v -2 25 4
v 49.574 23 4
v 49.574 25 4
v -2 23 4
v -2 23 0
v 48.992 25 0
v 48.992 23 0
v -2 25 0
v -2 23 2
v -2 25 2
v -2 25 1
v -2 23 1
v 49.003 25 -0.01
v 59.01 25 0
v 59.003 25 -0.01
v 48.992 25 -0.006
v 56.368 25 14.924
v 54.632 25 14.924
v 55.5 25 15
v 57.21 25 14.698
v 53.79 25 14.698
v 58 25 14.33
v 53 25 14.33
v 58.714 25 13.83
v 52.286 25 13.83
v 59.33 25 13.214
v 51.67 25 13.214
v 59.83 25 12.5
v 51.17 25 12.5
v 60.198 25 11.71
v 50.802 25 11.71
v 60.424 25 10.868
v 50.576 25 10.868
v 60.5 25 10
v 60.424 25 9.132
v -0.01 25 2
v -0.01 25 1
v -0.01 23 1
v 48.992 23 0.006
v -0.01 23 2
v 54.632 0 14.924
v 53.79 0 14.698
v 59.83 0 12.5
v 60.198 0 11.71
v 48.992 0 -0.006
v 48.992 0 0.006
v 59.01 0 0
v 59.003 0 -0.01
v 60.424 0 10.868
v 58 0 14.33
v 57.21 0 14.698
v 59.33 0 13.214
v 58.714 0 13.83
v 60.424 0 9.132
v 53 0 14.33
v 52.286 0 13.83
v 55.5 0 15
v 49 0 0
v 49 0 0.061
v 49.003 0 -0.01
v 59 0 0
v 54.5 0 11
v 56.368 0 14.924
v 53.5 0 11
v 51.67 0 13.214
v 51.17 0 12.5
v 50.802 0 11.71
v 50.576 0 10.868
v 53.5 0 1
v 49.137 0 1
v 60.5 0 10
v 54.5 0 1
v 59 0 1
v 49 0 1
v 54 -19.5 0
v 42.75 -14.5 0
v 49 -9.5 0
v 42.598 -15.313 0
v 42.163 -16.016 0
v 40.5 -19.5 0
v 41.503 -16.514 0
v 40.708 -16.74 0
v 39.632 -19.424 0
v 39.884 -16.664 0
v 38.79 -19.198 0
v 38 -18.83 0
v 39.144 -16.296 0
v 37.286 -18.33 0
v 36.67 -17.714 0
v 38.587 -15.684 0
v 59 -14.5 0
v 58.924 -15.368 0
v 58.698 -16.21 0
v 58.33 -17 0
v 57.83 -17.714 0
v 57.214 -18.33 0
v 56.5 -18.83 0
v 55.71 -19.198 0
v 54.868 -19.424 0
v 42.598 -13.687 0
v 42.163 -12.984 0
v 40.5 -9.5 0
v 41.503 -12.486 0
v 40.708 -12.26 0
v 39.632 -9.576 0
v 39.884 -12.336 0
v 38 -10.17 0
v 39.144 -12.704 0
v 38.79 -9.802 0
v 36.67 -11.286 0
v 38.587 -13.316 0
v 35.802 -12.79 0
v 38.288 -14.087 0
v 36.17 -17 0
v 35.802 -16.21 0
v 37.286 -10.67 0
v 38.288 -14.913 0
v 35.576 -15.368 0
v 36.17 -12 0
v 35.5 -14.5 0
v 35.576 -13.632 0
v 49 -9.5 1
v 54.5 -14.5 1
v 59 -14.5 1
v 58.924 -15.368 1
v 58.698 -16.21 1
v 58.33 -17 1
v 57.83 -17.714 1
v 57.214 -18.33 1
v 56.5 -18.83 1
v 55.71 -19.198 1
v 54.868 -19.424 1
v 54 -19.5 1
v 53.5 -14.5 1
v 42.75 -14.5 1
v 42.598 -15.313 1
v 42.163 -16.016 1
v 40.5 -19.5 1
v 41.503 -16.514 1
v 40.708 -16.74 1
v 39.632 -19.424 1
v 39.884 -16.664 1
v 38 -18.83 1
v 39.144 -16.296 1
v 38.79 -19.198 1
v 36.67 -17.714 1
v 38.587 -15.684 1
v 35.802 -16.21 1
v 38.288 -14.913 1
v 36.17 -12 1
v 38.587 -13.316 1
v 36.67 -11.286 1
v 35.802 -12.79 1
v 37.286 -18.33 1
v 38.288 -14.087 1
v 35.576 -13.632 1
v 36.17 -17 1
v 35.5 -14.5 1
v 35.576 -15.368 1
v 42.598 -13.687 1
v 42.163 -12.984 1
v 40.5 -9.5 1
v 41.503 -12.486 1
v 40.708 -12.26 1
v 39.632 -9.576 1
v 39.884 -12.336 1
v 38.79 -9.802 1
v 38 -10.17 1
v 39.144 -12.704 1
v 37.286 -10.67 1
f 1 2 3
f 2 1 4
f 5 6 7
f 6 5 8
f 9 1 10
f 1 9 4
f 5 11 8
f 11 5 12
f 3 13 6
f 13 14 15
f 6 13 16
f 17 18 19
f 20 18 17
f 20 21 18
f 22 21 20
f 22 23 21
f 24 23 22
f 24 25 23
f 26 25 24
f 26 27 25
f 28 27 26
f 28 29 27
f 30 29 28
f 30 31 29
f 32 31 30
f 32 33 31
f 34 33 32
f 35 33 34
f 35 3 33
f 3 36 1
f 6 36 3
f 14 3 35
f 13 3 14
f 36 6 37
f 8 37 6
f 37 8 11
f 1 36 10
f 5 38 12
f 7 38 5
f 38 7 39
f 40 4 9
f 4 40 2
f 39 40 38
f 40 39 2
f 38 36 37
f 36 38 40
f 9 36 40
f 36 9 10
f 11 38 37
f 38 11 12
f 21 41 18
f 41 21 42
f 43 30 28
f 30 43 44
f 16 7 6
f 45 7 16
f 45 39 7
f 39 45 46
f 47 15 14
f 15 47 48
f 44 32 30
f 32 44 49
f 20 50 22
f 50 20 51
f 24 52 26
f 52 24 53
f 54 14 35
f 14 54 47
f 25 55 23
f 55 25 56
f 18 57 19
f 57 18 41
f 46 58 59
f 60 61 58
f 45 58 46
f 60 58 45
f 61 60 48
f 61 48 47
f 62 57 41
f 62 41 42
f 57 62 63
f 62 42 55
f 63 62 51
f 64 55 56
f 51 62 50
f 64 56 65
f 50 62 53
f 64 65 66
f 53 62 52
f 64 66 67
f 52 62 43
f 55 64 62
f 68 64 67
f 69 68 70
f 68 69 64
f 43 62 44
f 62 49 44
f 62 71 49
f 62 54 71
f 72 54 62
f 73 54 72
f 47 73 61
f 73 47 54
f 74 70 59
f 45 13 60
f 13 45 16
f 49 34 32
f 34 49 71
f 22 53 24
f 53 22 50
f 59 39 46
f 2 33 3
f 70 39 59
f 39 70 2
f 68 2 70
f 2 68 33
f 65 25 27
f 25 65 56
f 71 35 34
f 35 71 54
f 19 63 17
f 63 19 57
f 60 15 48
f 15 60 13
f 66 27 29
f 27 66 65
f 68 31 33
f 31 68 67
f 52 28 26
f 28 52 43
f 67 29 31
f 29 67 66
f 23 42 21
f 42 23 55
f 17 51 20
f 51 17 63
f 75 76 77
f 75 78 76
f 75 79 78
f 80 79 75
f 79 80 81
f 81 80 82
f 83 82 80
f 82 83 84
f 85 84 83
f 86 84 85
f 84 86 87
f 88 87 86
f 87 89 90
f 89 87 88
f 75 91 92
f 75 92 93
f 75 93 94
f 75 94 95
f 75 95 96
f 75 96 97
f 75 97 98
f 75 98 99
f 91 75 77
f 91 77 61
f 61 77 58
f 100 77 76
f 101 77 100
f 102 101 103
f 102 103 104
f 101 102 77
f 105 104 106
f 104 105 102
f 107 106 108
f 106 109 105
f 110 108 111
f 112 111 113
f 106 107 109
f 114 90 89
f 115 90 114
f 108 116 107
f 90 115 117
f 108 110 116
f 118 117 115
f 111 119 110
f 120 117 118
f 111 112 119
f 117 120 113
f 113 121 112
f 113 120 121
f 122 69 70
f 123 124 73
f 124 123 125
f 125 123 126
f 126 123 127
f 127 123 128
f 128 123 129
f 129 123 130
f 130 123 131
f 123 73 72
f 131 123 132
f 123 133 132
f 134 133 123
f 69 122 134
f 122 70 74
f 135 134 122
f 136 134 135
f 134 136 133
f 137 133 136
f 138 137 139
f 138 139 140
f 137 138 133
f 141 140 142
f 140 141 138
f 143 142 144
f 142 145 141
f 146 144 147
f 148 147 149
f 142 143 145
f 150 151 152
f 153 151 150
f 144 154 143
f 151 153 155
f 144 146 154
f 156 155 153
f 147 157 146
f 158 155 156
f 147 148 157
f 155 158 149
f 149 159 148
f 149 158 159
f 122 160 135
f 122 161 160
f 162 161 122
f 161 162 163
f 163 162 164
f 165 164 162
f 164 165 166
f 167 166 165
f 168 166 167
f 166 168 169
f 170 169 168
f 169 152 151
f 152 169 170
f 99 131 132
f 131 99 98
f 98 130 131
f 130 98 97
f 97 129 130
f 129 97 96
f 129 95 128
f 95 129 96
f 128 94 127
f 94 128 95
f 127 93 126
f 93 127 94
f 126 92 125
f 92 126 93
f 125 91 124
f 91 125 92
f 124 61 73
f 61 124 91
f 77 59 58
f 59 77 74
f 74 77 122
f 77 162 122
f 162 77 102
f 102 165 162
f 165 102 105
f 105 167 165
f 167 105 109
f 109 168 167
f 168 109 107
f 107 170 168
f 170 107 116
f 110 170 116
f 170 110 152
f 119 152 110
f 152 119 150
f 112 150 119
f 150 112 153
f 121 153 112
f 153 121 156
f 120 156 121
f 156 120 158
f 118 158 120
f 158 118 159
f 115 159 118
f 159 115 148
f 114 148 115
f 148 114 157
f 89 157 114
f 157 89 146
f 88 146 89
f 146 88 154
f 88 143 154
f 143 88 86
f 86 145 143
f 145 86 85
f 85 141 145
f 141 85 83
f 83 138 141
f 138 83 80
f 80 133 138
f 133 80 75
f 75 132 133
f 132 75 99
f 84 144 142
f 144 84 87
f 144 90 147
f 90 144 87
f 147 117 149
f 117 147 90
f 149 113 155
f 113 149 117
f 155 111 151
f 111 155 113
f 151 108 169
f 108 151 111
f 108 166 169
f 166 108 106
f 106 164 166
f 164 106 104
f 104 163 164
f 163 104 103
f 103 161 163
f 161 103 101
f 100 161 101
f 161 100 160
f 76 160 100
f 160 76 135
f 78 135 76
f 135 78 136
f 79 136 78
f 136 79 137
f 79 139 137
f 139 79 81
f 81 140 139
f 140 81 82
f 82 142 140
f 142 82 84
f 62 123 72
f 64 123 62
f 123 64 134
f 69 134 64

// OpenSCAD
$fa = 1;
$fs = 1.75 / 2;

inner_width = 49;
inner_depth = 25;

grip_height = 10;

// grip
hull() {
    translate([inner_width + 5 + 1.5, 0, grip_height])
    rotate([-90, 0, 0])
    cylinder(r = 5, h = inner_depth);

    translate([inner_width, 0, 0])
    rotate([-90, 0, 0])
    cylinder(r = 0.01, h = inner_depth);

    translate([inner_width + 10, 0, 0])
    rotate([-90, 0, 0])
    cylinder(r = 0.01, h = inner_depth);
}

// arm
translate([0, inner_depth - 2, 0])
cube([inner_width + 5, 2, 4]);

// case clip
translate([-2, inner_depth - 2, 0])
difference() {
    cube([2, 2, 4]);
    translate([-0.01, -0.01, 1])
    cube([2, 2 + 0.02, 1]);
}

// Screw arm
translate([inner_width - 8.5, -14.5, 0])
linear_extrude(height = 1)
union() {
    difference() {
        hull() {
            circle(r = 5);
            translate([8.5 + 5, 0, 0])
            circle(r = 5);
        }

        circle(r = 2.25);
    }

    translate([8.5, 0])
    square([10, 14.5]);
}

// Arm support
translate([inner_width + 5 + 0.5, -14.5, 1])
rotate([0, -90, 0])
linear_extrude(height = 1)
polygon(points = [
    [0, 0],
    [grip_height, 14.5],
    [0, 14.5],
]);
